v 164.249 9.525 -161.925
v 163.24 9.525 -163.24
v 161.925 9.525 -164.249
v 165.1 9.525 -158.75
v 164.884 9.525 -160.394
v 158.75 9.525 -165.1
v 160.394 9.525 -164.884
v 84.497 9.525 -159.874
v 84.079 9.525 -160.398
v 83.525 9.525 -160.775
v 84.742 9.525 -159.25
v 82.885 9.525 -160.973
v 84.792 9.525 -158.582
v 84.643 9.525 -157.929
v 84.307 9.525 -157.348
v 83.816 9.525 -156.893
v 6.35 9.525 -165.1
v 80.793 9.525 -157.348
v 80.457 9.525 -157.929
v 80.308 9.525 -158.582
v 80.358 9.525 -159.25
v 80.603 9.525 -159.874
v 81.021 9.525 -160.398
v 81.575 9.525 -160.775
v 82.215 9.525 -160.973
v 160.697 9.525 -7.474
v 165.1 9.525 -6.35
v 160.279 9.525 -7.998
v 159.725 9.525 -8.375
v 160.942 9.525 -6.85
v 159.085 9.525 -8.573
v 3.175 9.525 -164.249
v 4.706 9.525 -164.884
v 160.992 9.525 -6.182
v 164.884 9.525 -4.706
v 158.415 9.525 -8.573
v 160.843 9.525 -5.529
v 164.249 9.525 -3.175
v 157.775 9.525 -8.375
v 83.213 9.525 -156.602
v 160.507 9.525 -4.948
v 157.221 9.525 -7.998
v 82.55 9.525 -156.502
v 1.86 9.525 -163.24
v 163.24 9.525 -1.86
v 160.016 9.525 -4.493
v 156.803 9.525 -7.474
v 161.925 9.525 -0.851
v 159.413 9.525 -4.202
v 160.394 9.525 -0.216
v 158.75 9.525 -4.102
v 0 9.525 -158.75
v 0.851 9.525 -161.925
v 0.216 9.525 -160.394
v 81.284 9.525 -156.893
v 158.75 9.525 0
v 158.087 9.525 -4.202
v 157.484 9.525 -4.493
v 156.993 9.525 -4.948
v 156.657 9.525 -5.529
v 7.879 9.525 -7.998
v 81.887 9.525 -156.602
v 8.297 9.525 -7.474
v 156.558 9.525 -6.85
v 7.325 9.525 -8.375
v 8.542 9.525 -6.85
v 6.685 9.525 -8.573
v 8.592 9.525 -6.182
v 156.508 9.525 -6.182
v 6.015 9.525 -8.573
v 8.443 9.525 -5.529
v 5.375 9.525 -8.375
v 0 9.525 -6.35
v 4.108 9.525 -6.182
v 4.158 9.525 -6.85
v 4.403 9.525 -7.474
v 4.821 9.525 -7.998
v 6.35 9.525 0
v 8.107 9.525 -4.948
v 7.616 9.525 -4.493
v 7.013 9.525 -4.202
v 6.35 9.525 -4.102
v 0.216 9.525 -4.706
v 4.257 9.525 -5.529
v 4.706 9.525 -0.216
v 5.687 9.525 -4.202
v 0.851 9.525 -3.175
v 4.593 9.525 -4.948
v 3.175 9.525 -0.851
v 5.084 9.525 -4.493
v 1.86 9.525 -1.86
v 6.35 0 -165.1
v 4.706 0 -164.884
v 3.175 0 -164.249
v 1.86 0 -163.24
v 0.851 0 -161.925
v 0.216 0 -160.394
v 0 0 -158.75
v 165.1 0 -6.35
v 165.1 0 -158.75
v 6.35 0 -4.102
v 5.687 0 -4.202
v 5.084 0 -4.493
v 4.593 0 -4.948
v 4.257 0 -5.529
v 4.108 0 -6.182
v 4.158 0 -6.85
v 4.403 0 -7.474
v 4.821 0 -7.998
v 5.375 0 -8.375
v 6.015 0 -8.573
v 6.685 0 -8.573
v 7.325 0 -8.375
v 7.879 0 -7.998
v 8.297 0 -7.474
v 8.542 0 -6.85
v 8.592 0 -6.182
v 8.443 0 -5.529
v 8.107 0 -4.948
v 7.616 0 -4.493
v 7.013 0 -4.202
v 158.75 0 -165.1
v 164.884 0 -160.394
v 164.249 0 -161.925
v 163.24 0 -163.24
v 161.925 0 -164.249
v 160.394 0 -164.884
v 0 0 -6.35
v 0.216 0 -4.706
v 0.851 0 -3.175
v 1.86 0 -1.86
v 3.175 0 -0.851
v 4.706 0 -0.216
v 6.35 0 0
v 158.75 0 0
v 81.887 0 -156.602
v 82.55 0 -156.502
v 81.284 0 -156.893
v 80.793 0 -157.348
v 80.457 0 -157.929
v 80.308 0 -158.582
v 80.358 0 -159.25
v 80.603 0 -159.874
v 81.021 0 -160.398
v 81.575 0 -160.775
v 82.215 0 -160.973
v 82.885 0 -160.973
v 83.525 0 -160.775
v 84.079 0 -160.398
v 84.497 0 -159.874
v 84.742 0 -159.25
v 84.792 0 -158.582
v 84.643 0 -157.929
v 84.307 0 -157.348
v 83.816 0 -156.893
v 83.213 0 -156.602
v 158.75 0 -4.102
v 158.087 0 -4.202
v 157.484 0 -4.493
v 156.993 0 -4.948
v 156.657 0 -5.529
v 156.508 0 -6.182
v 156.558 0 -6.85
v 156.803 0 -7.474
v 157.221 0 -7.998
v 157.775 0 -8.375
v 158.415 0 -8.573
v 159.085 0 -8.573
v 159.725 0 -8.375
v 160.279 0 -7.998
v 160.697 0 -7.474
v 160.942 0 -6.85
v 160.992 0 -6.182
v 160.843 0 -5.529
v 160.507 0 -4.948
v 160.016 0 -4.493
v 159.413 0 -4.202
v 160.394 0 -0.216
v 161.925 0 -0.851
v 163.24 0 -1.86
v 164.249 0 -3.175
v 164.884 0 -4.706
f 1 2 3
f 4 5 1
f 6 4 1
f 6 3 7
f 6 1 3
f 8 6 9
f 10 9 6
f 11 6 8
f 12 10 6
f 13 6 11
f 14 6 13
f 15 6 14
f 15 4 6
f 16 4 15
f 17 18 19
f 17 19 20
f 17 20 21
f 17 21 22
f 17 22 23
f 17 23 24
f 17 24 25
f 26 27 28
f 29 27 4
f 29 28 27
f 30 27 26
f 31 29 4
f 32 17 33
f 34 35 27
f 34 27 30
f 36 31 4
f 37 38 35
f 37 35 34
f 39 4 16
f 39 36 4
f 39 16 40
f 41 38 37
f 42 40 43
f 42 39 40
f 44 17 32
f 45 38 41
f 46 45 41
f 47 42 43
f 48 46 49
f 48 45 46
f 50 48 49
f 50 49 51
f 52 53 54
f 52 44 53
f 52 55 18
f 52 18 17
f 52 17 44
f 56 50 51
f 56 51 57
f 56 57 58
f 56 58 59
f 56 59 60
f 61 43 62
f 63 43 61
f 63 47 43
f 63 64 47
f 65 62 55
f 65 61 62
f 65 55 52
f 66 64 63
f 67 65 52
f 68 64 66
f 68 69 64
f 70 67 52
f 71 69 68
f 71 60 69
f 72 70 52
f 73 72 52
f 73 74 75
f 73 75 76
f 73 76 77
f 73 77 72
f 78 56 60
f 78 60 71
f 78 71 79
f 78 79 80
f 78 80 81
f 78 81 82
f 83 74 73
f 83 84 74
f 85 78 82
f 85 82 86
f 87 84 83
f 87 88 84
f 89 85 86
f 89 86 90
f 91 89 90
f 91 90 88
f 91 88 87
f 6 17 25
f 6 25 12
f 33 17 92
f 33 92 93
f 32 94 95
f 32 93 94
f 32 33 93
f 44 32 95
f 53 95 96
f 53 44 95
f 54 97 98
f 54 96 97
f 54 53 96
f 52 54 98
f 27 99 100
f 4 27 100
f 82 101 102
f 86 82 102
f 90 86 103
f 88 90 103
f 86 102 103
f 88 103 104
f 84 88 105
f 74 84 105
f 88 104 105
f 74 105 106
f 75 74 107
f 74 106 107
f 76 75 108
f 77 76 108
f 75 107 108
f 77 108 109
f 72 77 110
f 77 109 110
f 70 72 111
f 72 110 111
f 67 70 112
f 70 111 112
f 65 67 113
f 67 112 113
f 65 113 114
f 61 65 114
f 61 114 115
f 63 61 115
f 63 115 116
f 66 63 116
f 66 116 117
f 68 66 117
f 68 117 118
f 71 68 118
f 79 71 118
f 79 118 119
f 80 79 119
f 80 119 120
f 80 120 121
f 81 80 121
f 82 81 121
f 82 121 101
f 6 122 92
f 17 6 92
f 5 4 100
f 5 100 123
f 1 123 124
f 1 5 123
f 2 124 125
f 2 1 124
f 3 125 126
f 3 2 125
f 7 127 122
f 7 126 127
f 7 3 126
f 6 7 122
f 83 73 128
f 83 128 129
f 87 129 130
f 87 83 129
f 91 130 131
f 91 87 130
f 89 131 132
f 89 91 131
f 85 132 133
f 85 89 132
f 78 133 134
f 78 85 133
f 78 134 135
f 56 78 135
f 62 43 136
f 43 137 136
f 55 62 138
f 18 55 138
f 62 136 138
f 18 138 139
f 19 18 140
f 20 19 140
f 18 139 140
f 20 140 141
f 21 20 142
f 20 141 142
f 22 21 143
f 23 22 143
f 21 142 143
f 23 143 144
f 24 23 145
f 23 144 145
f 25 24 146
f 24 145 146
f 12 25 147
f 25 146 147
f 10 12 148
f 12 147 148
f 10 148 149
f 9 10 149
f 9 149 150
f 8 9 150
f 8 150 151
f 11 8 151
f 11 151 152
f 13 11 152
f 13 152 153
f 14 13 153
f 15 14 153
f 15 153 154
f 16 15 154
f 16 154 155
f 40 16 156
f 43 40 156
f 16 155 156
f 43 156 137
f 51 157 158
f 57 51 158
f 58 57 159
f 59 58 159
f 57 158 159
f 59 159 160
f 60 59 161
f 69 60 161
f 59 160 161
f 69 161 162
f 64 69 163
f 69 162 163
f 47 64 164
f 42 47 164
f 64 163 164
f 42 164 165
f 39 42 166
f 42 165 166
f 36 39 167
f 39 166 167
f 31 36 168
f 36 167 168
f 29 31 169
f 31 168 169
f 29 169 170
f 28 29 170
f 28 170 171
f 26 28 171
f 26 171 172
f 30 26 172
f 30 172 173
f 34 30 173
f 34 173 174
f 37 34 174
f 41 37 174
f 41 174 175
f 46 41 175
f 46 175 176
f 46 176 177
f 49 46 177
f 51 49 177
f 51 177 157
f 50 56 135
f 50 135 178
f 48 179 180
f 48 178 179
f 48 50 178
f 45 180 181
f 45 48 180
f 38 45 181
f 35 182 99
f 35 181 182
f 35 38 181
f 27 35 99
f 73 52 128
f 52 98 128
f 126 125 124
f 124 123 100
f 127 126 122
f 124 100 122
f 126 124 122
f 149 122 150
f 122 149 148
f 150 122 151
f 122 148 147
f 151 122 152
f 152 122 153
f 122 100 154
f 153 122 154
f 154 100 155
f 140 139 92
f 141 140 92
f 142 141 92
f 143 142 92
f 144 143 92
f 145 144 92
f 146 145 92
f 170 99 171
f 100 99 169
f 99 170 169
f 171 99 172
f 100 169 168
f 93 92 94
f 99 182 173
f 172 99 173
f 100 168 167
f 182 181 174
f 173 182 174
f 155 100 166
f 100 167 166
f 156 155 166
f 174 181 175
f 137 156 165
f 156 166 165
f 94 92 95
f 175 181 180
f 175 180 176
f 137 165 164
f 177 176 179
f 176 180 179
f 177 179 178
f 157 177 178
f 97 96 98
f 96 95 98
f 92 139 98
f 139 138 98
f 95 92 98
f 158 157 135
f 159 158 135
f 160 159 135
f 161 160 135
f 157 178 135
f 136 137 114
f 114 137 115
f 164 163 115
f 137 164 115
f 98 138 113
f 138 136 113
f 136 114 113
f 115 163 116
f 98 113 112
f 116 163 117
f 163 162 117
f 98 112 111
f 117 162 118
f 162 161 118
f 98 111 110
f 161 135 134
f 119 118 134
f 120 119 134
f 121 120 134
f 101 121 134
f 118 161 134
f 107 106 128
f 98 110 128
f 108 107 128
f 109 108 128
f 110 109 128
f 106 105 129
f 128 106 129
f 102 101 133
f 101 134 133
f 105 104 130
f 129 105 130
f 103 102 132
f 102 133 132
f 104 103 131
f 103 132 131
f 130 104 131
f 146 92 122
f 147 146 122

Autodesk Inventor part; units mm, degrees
ref_plane "YZ Plane" through (0, 0, 0) normal (1, 0, 0) x (0, 1, 0)
ref_plane "XZ Plane" through (0, 0, 0) normal (0, 1, 0) x (-1, 0, 0)
ref_plane "XY Plane" through (0, 0, 0) normal (0, 0, 1) x (1, 0, 0)
sketch "Sketch1" plane through (0, 0, 0) normal (0, 1, 0) x (-1, 0, 0)
  line L0 (0, 0) -> (-165.1, 0)
  line L1 (-165.1, 0) -> (-165.1, -165.1)
  line L2 (-165.1, -165.1) -> (0, -165.1)
  line L3 (0, -165.1) -> (0, 0)
  dimension "d0" = 165.1
  dimension "d1" = 165.1
extrude "Extrusion1" add sketch "Sketch1" along normal blind 9.525
fillet "Fillet1" radius 6.35 4 edges at (165.1, 4.7625, 0) (165.1, 4.7625, -165.1) (0, 4.7625, -165.1) (0, 4.7625, 0)
sketch "Sketch4" plane through (0, 9.525, 0) normal (0, 1, 0) x (1, 0, 0)
  arc A0 (0, 6.35) -> (6.35, 0) centre (6.35, 6.35) ccw projected
  line L0 (6.35, 0) -> (158.75, 0) projected
  arc A1 (158.75, 0) -> (165.1, 6.35) centre (158.75, 6.35) ccw projected
  line L1 (165.1, 6.35) -> (165.1, 158.75) projected
  arc A2 (165.1, 158.75) -> (158.75, 165.1) centre (158.75, 158.75) ccw projected
  line L2 (158.75, 165.1) -> (6.35, 165.1) projected
  arc A3 (6.35, 165.1) -> (0, 158.75) centre (6.35, 158.75) ccw projected
  line L3 (0, 158.75) -> (0, 6.35) projected
  line L4 (82.55, 158.75) -> (82.55, 6.35)
  line L5 (82.55, 6.35) -> (6.35, 6.35)
  line L6 (6.35, 6.35) -> (82.55, 6.35)
  line L7 (158.75, 6.35) -> (82.55, 6.35)
  point P0 (0, 0)
  point P1 (82.55, 0)
  dimension "d15" = 6.35
  dimension "d16" = 76.2
  dimension "d18" = 6.35
hole "Hole2" at (82.55, 9.525, -158.75) at (158.75, 9.525, -6.35) at (6.35, 9.525, -6.35) direction (0, -1, 0) diameter 4.4958 end through all clearance for "Countersunk Flat Head Screw ISO 2009/7046" size "M4" standard "ISO"
equation "\"d18\" = d15"
properties part number "Print Bed"
